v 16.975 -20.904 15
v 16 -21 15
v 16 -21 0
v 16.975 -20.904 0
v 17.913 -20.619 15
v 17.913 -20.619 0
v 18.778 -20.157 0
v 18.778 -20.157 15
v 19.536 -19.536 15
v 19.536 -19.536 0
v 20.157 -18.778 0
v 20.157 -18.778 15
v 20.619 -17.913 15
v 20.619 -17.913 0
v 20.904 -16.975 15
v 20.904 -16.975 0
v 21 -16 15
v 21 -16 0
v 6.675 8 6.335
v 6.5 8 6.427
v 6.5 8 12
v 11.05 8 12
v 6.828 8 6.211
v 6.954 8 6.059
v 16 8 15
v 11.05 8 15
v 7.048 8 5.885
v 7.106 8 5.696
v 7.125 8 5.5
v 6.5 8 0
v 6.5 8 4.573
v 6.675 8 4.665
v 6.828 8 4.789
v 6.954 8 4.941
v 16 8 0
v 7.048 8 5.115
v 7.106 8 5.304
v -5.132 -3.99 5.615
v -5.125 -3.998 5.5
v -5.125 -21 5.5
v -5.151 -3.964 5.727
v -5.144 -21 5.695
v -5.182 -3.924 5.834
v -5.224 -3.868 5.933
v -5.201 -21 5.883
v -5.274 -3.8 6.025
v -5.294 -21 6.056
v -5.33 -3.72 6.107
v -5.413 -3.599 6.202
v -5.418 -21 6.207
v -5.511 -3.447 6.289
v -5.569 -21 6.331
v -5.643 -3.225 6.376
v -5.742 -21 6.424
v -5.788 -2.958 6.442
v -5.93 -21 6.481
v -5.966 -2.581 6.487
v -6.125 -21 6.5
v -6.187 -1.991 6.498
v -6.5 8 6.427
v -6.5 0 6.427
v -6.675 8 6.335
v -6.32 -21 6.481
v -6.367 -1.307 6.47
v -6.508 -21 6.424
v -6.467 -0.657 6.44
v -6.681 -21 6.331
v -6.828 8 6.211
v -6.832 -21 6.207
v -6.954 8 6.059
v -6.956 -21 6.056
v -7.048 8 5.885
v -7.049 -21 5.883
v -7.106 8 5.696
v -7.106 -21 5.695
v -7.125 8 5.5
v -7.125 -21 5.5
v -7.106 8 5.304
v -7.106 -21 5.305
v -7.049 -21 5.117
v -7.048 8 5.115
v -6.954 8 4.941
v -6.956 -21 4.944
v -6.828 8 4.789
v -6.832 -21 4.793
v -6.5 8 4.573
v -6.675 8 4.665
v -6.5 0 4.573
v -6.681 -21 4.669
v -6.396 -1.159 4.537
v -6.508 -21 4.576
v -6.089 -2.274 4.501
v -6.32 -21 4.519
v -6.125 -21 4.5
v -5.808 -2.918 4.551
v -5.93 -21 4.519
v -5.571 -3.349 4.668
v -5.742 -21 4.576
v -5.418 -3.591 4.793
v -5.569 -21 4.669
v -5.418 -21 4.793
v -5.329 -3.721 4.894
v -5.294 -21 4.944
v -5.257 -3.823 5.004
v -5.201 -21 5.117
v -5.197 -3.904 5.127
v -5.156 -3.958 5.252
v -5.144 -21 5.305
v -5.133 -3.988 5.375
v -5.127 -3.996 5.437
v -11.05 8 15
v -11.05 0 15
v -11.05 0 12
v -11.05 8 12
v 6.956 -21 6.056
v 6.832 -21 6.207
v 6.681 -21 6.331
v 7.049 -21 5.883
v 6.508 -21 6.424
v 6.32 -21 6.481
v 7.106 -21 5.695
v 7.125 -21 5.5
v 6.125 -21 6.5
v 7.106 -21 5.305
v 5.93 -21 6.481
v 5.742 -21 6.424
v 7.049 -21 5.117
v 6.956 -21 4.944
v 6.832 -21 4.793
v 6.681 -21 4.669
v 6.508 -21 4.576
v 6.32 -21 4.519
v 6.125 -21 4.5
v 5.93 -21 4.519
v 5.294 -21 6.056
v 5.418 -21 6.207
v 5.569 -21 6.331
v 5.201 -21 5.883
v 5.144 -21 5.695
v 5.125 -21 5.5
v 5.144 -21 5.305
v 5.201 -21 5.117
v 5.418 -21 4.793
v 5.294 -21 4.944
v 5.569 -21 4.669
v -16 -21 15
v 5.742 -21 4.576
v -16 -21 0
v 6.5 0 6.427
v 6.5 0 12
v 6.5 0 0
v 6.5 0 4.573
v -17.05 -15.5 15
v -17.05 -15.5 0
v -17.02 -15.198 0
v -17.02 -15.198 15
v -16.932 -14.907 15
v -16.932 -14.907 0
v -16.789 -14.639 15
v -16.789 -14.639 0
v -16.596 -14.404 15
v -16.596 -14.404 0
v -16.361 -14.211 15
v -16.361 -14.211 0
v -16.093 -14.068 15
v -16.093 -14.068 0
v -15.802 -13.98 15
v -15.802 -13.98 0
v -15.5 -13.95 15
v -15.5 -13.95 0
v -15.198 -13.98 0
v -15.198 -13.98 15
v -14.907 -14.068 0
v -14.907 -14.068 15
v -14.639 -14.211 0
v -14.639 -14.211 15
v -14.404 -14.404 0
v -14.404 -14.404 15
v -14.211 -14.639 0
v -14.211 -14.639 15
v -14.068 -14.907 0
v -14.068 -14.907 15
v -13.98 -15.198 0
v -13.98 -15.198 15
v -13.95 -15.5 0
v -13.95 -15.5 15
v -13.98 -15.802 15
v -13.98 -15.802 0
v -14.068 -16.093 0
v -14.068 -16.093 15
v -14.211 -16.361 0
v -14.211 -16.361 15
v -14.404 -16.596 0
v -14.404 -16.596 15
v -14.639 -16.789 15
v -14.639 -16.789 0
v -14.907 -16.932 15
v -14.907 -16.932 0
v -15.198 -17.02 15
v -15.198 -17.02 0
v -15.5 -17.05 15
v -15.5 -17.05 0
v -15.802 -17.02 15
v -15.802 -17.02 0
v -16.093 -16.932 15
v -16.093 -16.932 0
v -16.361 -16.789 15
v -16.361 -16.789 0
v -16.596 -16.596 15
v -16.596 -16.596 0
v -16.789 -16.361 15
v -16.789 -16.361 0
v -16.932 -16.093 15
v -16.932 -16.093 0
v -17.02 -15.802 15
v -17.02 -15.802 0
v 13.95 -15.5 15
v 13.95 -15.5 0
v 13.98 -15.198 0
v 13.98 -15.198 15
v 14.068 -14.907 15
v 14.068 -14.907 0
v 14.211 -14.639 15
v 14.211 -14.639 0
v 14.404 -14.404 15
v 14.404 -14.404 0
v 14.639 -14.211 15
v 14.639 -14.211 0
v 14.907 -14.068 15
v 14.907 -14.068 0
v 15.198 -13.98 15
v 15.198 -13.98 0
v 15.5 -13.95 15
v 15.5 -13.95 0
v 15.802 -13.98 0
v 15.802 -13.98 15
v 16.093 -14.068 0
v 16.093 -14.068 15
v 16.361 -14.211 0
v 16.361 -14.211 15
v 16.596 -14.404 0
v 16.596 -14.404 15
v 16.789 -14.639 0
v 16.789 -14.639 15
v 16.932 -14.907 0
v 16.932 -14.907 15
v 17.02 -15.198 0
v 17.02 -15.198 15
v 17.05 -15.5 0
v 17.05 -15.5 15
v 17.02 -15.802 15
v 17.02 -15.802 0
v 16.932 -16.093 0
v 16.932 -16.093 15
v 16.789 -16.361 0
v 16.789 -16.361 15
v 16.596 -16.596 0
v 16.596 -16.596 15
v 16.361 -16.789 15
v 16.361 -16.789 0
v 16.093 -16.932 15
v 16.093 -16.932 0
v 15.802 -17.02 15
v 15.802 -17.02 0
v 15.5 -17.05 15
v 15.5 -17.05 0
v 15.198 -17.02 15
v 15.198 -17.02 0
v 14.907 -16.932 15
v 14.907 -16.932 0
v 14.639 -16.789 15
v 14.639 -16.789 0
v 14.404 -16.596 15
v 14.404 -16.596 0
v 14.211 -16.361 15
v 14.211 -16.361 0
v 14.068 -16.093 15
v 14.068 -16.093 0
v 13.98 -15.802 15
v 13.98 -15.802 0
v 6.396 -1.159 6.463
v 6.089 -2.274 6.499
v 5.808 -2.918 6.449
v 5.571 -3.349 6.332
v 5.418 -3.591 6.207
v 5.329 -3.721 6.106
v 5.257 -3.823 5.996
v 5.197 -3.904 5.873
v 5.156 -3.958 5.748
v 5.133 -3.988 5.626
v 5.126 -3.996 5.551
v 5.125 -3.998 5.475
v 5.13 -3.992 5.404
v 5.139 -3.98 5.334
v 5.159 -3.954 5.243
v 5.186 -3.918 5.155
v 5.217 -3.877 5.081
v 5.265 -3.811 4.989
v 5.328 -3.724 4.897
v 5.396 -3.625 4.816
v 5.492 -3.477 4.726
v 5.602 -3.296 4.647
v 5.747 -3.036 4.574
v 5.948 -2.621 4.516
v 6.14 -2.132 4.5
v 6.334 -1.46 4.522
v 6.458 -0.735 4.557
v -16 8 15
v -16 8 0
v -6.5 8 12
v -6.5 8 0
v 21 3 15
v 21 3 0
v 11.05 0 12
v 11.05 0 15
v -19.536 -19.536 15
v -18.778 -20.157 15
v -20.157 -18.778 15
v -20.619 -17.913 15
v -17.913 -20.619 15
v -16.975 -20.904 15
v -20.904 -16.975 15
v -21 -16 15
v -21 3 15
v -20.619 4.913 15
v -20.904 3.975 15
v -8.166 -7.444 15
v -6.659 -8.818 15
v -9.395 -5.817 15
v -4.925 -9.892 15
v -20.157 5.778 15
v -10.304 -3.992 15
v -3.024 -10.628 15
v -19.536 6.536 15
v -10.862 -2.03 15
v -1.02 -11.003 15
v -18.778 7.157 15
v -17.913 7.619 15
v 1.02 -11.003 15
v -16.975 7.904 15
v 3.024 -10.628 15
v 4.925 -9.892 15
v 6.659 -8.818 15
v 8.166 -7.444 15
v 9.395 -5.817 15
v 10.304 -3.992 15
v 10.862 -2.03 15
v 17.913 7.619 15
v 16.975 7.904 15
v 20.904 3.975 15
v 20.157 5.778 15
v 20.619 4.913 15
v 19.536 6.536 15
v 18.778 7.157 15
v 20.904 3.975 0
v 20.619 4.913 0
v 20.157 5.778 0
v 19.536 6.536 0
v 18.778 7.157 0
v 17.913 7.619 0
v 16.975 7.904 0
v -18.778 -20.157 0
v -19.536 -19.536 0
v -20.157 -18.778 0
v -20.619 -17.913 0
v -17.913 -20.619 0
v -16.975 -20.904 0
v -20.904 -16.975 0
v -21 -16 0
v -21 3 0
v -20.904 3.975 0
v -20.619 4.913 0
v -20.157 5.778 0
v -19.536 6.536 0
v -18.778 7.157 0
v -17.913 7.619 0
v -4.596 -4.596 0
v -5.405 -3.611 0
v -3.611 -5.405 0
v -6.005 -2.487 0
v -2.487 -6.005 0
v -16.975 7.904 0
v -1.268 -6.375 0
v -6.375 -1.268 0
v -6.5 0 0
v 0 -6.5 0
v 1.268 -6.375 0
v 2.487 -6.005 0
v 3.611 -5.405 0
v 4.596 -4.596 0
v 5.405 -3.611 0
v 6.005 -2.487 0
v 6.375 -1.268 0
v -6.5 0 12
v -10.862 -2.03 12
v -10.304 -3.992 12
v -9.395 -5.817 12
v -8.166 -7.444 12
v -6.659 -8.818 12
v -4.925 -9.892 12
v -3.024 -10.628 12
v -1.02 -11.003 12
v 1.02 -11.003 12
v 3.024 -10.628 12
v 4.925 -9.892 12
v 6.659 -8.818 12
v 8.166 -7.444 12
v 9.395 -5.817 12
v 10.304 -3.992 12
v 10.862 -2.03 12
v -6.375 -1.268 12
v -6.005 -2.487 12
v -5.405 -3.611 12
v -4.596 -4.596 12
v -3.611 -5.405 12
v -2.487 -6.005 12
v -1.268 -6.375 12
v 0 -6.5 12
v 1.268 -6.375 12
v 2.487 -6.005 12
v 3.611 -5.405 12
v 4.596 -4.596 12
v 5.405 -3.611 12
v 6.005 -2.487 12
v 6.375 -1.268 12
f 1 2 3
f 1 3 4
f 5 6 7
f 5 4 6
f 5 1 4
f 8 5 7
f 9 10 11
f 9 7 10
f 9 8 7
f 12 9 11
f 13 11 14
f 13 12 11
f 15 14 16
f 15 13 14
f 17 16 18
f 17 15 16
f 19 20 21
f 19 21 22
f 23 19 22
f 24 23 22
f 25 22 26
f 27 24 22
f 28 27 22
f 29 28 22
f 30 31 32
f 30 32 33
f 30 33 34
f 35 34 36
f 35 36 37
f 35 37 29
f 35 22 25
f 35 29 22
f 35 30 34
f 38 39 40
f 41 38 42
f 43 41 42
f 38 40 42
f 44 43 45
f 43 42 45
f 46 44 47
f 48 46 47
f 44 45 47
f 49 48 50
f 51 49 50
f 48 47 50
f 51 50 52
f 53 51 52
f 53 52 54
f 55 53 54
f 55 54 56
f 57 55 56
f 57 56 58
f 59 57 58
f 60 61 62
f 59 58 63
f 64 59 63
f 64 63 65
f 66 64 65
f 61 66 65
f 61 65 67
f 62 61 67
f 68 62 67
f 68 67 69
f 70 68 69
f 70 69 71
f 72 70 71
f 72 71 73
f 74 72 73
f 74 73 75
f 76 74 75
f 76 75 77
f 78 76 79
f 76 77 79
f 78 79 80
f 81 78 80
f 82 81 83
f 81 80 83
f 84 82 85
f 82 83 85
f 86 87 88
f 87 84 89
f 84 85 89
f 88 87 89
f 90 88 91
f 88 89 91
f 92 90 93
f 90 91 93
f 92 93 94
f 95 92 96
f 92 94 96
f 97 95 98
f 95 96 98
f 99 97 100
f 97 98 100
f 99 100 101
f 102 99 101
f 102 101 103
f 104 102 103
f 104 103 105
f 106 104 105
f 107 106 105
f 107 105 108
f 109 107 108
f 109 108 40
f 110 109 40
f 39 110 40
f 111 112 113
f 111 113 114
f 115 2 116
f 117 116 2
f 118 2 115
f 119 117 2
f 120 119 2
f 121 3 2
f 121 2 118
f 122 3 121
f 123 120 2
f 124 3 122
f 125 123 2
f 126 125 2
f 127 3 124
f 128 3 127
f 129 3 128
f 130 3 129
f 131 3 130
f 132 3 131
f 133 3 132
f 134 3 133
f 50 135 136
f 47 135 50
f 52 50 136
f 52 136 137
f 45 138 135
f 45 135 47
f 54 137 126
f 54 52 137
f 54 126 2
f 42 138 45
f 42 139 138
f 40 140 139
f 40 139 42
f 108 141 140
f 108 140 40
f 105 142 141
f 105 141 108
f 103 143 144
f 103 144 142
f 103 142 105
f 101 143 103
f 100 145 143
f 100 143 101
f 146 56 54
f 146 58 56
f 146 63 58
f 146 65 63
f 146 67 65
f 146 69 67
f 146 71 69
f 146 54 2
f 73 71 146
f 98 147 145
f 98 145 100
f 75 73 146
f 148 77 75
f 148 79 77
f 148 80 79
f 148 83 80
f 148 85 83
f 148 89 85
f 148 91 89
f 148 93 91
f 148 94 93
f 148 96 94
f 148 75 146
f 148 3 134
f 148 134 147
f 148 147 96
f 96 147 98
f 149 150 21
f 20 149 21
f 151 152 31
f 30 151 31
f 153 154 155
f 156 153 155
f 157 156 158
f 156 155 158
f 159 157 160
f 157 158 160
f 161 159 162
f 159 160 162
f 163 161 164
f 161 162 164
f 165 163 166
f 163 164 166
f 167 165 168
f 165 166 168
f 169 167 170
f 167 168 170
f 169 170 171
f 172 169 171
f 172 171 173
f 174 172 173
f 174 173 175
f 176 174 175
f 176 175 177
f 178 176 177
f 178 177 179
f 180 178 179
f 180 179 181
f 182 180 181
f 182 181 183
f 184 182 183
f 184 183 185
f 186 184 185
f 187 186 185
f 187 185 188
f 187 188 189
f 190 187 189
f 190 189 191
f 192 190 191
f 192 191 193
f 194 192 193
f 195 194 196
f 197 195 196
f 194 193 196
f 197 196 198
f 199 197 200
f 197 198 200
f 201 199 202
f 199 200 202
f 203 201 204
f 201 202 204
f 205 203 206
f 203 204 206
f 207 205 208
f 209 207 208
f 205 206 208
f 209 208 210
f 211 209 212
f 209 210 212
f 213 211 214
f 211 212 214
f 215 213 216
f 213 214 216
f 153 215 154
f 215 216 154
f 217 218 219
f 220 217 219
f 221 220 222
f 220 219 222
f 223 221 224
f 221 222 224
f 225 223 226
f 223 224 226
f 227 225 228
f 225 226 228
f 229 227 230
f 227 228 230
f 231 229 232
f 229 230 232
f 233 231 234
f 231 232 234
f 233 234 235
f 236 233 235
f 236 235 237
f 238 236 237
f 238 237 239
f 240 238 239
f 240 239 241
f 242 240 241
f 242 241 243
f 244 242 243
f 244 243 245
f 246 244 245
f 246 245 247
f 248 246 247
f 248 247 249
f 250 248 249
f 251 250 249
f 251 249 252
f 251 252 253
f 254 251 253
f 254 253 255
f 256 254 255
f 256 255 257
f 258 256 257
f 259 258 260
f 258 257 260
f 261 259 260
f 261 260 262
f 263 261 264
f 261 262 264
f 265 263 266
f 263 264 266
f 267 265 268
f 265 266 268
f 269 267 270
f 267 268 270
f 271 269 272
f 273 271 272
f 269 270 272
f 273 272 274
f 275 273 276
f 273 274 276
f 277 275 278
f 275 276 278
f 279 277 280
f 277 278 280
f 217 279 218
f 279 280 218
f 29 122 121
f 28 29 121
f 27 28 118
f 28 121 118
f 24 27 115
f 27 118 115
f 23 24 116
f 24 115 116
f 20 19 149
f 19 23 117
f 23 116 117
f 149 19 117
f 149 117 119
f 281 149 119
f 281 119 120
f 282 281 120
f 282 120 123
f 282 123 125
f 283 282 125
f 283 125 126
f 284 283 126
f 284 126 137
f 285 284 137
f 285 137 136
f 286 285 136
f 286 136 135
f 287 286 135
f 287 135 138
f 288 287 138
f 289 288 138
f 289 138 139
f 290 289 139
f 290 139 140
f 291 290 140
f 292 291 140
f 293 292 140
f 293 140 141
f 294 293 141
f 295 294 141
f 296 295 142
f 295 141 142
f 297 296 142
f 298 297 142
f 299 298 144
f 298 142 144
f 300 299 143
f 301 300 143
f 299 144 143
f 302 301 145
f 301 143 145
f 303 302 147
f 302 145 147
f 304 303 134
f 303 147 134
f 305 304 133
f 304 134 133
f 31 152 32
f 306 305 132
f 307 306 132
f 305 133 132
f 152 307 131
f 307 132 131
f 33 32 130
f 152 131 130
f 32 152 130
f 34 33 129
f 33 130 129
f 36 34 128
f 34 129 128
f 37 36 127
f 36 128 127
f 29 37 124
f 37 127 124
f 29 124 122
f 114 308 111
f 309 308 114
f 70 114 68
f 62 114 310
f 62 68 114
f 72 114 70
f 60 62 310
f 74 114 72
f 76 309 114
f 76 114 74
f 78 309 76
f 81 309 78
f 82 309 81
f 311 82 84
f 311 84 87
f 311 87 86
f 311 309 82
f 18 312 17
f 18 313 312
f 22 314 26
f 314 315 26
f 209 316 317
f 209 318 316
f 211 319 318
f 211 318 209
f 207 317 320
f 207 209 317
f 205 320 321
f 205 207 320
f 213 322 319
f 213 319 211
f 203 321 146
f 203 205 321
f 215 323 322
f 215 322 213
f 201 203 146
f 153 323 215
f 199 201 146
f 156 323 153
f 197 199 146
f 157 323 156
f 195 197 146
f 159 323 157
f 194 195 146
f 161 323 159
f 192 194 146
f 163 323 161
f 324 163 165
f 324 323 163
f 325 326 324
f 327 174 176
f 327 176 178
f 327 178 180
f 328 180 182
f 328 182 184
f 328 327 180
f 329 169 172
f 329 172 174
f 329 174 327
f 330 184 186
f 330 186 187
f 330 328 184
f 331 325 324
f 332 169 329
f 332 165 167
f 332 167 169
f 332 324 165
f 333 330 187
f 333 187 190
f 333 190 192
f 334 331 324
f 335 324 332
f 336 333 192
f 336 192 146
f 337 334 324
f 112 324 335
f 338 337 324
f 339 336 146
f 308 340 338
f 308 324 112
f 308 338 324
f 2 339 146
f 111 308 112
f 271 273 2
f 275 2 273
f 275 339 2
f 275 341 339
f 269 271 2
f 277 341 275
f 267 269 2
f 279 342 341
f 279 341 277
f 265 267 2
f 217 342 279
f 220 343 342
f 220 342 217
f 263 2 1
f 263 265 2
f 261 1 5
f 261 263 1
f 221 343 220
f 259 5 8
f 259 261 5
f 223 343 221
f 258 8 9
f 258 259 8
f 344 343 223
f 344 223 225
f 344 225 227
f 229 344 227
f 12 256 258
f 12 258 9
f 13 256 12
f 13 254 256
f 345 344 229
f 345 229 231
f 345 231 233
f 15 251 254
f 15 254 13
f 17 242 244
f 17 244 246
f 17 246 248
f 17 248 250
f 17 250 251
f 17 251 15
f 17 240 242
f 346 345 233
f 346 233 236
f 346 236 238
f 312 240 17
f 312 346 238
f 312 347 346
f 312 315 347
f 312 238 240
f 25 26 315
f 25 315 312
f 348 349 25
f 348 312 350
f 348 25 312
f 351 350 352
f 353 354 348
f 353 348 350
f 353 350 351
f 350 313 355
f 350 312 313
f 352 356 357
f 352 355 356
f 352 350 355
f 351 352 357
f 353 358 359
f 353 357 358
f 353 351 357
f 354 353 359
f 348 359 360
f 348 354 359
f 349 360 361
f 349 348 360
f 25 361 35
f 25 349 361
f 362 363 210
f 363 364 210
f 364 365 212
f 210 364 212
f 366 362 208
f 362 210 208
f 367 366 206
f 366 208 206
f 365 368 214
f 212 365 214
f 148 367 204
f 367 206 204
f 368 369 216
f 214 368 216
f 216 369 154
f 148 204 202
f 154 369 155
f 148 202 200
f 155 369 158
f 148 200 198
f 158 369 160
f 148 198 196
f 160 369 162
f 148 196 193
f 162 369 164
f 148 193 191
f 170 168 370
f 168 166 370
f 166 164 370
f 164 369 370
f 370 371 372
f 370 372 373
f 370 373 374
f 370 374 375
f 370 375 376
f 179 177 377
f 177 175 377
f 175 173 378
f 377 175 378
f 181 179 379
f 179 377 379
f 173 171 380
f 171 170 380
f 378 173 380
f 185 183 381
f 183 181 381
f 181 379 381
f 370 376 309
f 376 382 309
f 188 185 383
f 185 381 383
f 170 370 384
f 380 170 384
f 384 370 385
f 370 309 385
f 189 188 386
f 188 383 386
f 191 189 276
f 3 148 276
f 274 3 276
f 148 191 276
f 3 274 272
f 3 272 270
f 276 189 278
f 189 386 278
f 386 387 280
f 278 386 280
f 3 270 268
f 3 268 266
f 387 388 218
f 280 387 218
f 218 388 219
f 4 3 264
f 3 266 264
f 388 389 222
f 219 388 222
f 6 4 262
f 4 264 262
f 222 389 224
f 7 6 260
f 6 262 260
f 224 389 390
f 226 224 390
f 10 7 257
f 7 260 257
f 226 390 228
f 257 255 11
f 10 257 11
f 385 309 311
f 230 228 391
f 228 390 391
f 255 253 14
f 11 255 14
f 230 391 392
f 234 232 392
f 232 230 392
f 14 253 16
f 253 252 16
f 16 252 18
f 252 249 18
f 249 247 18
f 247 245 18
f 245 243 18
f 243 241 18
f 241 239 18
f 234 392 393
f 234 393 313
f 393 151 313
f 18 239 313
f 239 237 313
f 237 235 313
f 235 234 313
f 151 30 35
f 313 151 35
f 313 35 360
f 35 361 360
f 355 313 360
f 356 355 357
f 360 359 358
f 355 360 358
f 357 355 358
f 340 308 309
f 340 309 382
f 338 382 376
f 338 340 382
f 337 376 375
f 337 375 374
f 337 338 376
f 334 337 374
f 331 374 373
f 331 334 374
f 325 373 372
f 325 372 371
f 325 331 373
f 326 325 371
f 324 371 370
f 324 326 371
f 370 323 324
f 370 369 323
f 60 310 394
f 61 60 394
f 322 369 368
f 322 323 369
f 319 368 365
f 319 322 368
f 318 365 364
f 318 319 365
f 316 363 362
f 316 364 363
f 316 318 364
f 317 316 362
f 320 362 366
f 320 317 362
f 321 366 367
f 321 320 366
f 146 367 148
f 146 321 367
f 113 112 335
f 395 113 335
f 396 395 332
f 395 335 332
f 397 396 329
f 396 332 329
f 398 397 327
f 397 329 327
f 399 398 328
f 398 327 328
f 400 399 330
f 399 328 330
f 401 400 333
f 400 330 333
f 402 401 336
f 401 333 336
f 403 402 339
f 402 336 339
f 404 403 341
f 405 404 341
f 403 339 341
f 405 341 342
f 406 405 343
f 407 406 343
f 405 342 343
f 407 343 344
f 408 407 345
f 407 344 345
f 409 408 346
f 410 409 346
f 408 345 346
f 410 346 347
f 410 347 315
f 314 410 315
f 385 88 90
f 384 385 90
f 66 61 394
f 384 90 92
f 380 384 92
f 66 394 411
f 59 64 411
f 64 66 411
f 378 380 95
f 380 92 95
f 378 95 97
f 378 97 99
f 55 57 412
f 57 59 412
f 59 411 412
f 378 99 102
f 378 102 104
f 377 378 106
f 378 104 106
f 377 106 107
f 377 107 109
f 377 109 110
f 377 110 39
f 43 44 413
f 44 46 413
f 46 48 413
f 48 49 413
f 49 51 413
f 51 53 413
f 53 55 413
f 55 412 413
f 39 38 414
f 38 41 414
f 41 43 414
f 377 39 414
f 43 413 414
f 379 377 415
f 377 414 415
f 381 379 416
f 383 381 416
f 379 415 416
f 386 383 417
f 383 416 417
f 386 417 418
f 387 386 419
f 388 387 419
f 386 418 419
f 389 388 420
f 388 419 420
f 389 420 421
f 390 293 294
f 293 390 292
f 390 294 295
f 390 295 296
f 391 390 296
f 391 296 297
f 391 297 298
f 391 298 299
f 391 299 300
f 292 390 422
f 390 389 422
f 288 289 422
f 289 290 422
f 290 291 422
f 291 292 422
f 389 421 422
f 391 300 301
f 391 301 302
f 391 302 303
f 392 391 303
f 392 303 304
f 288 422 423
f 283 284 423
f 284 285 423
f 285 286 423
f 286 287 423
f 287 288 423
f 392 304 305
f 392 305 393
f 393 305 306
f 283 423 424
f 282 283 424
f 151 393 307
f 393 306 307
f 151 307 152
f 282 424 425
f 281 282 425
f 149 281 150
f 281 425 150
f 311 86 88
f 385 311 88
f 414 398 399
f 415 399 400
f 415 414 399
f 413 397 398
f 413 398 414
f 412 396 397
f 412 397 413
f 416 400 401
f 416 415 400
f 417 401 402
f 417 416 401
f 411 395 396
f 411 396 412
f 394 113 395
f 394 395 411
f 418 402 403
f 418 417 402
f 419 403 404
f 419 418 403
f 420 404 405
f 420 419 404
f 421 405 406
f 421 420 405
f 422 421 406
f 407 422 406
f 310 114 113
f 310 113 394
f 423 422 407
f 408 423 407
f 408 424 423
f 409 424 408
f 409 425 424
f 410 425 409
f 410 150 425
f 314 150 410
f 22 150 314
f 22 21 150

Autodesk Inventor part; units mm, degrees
ref_plane "YZ Plane" through (0, 0, 0) normal (1, 0, 0) x (0, 1, 0)
ref_plane "XZ Plane" through (0, 0, 0) normal (0, 1, 0) x (-1, 0, 0)
ref_plane "XY Plane" through (0, 0, 0) normal (0, 0, 1) x (1, 0, 0)
sketch "Sketch1" plane through (0, 0, 0) normal (0, 0, 1) x (1, 0, 0)
  line L0 (-21, 8) -> (21, 8)
  line L1 (21, 8) -> (21, -21)
  line L2 (21, -21) -> (-21, -21)
  line L3 (-21, -21) -> (-21, 8)
  point P0 (0, 0)
  point P1 (0, -21)
  dimension "d0" = 21
  dimension "d1" = 42
  dimension "d2" = 29
extrude "Extrusion1" add sketch "Sketch1" along normal blind 15
fillet "Fillet1" radius 5 4 edges at (21, -21, 7.5) (-21, 8, 7.5) (21, 8, 7.5) (-21, -21, 7.5)
sketch "Sketch2" plane through (0, 0, 15) normal (0, 0, 1) x (1, 0, 0)
  line L0 (16, 8) -> (-16, 8) projected
  arc A0 (-11.05, 0) -> (11.05, 0) centre (0, 0) ccw
  line L1 (-11.05, 0) -> (-11.05, 8)
  line L2 (11.05, 0) -> (11.05, 8)
  dimension "d6" = 11.05
extrude "Extrusion2" cut sketch "Sketch2" against normal blind 3
sketch "Sketch3" plane through (0, 0, 12) normal (0, 0, 1) x (1, 0, 0)
  arc A0 (-11.05, 0) -> (11.05, 0) centre (0, 0) ccw projected
  line L0 (-11.05, 8) -> (11.05, 8) projected
  line L1 (-6.5, 8) -> (-6.5, 0)
  arc A1 (-6.5, 0) -> (6.5, 0) centre (0, 0) ccw
  line L2 (6.5, 0) -> (6.5, 8)
  dimension "d10" = 13
extrude "Extrusion3" cut sketch "Sketch3" against normal through all
sketch "Sketch4" plane through (-16, -21, 0) normal (0, -1, 0) x (1, 0, 0)
  line L0 (32, 0) -> (0, 0) projected
  line L1 (0, 15) -> (32, 15) projected
  line L2 (9.875, 5.5) -> (22.125, 5.5)
  circle A0 centre (9.875, 5.5) radius 1
  circle A1 centre (22.125, 5.5) radius 1
  point P0 (16, 0)
  point P1 (16, 0)
  point P2 (16, 5.5)
  dimension "d14" = 5.5
  dimension "d15" = 12.25
  dimension "d16" = 2
extrude "Extrusion4" cut sketch "Sketch4" against normal through all
sketch "Sketch5" plane through (0, 0, 0) normal (0, 0, -1) x (-1, 0, 0)
  arc A0 (-6.5, 0) -> (6.5, 0) centre (0, 0) ccw projected
  line L0 (-15.5, -15.5) -> (-15.5, 15.5)
  line L1 (-15.5, 15.5) -> (15.5, 15.5)
  line L2 (15.5, 15.5) -> (15.5, -15.5)
  line L3 (15.5, -15.5) -> (-15.5, -15.5)
  circle A1 centre (-15.5, -15.5) radius 1.55
  circle A2 centre (15.5, -15.5) radius 1.55
  dimension "d19" = 31
  dimension "d20" = 3.1
extrude "Extrusion5" cut sketch "Sketch5" against normal through all contours L3 A1 L0 | L0 A1 L3 | A2 L2 L3 | L3 L2 A2
properties part number "UHMW_block"
